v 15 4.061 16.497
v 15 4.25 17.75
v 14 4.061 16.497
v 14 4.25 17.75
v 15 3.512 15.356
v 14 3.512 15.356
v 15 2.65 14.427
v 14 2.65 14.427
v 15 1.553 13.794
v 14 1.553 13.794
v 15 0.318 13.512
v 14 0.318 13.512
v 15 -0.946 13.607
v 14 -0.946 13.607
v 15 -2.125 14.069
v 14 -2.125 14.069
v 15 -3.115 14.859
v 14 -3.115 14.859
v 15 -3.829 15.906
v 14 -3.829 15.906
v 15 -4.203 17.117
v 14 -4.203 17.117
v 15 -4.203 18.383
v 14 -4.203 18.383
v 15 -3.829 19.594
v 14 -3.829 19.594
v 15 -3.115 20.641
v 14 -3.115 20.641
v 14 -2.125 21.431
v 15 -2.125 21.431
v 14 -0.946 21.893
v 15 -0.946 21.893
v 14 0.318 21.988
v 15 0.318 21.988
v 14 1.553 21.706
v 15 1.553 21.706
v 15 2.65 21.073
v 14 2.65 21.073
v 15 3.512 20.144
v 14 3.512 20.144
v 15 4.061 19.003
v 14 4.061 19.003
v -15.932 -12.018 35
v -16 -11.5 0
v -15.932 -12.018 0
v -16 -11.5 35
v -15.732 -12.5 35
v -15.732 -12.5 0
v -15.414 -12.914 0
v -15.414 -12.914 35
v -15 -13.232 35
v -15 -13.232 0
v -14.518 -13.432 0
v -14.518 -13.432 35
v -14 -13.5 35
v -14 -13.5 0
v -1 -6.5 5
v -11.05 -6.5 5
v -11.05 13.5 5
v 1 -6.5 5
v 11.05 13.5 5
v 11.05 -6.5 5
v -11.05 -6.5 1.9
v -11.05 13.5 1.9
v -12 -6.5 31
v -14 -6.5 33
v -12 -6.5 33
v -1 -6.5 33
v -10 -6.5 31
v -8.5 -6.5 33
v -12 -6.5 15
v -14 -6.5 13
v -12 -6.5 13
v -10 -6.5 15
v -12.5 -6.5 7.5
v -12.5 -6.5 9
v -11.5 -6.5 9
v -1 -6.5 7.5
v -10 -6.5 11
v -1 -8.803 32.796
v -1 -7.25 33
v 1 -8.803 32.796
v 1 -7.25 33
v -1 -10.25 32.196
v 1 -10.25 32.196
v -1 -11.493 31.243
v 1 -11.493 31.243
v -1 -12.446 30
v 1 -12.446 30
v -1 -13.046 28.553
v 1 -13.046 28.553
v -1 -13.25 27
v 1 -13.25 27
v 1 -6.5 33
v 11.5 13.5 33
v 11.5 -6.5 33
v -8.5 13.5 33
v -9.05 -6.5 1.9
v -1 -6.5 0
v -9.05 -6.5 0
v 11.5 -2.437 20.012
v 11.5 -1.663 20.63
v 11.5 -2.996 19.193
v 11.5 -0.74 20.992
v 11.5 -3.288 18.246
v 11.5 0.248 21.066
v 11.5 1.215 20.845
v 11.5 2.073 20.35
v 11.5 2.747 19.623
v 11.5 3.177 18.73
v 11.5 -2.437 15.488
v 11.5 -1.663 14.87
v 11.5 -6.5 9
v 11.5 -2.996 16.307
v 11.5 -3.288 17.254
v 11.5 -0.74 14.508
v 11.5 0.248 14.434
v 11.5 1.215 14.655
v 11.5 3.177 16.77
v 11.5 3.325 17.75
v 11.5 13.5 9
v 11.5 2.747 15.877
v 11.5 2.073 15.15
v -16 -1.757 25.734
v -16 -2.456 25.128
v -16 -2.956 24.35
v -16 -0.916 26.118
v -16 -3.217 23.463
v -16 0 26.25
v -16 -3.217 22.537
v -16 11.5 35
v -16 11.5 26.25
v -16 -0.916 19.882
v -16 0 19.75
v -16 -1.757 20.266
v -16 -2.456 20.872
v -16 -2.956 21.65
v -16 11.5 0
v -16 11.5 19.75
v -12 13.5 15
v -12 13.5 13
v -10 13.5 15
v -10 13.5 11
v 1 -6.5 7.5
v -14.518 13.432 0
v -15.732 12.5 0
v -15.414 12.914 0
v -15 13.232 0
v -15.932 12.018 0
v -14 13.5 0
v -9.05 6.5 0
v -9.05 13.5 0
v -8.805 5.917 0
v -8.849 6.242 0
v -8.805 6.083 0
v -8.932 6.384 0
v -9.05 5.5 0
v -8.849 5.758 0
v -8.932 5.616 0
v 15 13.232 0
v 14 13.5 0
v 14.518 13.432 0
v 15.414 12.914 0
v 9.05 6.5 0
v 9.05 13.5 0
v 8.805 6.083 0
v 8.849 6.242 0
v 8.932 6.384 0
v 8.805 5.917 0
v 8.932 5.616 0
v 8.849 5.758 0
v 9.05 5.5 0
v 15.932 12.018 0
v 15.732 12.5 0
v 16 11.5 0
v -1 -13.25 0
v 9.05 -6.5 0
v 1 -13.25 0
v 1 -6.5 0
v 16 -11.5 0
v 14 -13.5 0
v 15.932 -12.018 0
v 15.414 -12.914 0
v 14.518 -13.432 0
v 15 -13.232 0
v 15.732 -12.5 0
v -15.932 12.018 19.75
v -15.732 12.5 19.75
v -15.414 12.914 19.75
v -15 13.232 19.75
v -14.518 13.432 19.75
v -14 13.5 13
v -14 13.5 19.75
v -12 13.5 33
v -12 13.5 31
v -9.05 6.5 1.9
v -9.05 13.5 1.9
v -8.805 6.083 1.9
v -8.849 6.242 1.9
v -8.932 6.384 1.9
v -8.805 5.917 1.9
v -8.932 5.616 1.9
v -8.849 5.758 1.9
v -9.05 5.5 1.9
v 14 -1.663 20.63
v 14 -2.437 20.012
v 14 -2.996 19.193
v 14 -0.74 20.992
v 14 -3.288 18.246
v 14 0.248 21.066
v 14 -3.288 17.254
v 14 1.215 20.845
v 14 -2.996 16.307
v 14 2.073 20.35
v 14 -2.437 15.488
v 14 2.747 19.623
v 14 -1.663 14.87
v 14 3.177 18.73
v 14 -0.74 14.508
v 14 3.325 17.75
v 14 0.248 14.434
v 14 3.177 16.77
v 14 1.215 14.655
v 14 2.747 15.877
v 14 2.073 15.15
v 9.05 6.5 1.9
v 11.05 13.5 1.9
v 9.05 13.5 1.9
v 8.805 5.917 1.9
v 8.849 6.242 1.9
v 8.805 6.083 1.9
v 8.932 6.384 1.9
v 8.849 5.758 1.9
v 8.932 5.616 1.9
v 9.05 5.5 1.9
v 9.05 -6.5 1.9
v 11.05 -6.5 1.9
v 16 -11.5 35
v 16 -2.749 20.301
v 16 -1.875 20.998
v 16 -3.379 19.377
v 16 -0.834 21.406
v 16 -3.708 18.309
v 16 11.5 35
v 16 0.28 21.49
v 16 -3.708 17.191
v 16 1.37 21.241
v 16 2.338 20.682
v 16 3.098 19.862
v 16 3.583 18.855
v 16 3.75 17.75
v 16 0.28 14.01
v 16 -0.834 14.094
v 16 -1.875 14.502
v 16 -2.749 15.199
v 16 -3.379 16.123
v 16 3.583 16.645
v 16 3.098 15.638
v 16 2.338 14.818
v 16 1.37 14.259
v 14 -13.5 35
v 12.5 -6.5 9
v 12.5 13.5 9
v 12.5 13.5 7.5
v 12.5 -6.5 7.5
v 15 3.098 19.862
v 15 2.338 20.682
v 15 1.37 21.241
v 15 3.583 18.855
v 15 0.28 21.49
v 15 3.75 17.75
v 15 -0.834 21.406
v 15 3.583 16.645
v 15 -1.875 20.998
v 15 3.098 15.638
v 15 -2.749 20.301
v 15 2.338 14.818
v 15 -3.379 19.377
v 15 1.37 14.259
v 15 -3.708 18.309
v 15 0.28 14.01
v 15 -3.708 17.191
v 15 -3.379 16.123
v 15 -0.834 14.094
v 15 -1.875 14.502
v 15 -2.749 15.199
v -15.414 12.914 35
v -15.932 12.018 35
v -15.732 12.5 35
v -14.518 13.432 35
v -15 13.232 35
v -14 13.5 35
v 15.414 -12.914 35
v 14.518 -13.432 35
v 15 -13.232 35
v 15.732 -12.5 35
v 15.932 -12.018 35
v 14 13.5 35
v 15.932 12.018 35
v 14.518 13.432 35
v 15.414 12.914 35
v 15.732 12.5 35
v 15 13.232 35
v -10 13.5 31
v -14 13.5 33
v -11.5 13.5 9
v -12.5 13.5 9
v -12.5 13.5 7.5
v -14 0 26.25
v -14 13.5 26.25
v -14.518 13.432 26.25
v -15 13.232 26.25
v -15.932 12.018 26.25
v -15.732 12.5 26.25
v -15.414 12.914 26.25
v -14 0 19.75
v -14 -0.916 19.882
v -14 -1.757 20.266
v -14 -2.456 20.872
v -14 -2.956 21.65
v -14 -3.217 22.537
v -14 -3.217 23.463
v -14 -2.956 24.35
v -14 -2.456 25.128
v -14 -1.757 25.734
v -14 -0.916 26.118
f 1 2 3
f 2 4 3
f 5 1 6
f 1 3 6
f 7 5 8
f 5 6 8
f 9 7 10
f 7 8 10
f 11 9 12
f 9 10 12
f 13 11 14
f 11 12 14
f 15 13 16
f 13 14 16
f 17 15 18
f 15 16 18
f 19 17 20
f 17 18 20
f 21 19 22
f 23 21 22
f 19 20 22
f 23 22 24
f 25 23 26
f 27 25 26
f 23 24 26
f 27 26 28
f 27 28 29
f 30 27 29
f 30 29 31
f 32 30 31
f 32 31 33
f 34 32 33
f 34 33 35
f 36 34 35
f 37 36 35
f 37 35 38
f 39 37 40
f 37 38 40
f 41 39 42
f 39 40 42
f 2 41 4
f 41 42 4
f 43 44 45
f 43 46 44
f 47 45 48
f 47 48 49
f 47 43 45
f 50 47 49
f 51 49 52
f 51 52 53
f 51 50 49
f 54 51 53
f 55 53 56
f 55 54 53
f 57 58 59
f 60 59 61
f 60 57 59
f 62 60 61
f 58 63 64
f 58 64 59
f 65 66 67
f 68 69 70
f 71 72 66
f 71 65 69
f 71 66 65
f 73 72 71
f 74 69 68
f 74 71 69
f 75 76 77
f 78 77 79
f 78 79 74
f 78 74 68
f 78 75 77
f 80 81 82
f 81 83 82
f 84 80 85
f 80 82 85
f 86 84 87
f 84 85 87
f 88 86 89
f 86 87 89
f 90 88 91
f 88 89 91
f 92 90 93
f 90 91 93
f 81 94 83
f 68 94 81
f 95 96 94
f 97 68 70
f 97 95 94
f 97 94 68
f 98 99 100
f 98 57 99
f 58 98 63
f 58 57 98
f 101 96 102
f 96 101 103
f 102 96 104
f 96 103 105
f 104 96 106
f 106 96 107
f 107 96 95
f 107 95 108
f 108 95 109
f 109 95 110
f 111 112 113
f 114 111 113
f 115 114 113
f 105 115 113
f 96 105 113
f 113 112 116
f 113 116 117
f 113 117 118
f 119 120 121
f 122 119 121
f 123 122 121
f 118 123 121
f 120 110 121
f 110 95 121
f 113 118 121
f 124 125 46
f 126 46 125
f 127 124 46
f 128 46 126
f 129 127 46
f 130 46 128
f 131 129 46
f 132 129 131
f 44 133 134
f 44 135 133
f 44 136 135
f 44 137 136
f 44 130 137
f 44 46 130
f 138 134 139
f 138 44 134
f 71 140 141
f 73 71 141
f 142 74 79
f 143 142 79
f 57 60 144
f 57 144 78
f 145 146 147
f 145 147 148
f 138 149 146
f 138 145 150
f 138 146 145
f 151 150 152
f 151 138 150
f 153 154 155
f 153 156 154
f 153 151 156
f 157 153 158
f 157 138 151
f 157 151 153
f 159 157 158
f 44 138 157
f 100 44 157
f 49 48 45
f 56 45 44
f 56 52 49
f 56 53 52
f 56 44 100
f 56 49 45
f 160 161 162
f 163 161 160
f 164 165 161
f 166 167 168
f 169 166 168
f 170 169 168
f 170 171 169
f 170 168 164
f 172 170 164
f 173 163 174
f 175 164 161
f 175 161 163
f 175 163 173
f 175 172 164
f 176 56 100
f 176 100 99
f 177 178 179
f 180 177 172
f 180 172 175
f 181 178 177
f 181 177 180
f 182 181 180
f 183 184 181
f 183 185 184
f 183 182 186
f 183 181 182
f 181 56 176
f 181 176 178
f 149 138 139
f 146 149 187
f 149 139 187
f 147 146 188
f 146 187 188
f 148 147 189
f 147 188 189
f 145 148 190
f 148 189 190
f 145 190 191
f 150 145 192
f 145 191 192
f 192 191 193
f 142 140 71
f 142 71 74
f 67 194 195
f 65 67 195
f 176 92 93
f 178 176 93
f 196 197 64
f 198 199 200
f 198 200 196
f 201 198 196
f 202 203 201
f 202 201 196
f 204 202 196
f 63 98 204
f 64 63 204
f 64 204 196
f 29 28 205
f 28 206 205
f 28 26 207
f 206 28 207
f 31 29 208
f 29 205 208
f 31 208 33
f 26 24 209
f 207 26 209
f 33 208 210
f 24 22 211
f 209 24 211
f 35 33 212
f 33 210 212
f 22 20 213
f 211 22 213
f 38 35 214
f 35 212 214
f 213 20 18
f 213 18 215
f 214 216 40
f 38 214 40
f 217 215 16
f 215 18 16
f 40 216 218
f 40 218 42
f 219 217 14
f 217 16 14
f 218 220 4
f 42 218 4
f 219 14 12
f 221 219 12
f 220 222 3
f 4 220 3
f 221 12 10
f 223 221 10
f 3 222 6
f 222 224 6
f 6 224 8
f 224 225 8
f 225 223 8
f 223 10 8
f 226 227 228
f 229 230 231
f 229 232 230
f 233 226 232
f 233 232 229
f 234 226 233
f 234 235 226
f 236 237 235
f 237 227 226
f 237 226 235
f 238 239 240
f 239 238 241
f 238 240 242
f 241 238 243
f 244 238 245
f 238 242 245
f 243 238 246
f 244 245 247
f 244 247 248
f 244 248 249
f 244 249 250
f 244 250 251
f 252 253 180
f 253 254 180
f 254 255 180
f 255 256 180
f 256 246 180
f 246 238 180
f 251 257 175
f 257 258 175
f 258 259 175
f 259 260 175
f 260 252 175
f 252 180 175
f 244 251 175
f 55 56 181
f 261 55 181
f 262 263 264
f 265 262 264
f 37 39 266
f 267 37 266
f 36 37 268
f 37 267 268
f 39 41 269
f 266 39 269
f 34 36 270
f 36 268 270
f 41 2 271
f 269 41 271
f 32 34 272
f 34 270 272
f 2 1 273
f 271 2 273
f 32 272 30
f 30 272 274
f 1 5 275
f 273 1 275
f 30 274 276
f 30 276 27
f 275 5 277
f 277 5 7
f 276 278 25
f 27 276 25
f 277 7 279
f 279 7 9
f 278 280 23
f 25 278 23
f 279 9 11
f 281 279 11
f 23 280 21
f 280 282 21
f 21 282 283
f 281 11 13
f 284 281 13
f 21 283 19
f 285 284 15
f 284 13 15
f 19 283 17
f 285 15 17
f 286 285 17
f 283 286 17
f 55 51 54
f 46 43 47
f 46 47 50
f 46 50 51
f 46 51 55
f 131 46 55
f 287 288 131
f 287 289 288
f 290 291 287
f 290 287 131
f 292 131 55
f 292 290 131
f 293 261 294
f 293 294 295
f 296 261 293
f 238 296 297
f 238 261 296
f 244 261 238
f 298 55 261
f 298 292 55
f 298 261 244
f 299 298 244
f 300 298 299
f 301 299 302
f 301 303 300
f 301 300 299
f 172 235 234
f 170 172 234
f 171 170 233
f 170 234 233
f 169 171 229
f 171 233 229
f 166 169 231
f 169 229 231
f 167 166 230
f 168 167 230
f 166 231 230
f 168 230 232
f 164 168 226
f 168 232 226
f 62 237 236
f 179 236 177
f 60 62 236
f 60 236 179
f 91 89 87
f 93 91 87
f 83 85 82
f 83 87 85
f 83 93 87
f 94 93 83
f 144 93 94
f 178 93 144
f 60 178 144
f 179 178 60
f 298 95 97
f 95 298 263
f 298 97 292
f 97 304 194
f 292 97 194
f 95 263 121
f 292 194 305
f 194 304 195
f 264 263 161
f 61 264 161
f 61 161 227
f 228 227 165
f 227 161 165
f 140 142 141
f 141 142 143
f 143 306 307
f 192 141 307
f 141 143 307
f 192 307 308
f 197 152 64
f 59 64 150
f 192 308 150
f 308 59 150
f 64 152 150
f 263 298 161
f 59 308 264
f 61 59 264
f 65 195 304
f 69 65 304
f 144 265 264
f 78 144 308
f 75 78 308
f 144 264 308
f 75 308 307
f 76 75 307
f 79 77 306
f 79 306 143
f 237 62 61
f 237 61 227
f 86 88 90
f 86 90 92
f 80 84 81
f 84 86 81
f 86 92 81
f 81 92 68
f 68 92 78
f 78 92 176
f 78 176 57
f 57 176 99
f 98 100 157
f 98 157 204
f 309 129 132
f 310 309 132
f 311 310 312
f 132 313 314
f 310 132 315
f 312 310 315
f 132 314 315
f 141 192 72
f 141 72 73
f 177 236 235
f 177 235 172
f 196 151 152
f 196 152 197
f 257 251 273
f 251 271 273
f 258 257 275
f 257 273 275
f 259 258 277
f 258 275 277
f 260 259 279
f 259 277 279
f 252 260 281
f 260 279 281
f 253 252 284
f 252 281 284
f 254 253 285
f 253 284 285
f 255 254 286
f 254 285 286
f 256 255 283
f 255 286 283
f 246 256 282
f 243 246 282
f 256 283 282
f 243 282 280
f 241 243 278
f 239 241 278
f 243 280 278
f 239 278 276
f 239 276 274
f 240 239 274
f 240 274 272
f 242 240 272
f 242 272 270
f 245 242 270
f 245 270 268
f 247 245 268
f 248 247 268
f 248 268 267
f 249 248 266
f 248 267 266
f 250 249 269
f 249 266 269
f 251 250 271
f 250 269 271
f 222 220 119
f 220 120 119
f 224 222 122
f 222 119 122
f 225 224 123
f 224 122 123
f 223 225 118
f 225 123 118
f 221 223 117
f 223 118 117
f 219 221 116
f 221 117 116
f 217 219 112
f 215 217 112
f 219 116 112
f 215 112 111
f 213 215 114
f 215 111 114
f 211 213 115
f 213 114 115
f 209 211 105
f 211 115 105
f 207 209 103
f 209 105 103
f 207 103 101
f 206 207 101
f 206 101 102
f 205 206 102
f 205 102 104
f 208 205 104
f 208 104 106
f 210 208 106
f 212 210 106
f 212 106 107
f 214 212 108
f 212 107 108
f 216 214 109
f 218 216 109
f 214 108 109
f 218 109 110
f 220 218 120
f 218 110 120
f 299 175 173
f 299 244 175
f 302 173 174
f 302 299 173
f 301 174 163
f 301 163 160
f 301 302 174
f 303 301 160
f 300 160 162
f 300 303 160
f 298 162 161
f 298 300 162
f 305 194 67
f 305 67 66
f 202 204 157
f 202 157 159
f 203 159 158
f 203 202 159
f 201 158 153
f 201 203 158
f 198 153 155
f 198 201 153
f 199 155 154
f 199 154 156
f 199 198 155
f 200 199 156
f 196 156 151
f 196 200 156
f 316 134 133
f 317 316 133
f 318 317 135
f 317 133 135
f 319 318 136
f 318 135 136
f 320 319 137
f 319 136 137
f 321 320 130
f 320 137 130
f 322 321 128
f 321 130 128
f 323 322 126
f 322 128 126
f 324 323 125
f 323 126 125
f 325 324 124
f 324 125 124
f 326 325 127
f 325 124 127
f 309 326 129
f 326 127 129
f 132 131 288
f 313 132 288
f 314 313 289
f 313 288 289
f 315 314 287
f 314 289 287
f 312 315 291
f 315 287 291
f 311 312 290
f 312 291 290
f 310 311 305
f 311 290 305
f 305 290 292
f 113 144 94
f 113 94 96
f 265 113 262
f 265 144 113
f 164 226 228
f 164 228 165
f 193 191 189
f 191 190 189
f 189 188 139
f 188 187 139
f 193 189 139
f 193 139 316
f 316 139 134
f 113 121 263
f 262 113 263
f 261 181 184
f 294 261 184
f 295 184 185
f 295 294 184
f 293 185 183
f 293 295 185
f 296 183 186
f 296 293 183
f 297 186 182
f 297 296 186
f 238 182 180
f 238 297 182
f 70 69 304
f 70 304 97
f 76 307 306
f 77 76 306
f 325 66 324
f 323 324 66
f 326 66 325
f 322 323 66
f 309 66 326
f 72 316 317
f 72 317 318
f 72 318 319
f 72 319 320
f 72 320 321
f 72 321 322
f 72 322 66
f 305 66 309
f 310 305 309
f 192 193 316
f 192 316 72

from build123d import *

# Parameters (mm, degrees)
SKETCH1_W               = 32
SKETCH1_H               = 27
BOSS_EXTRUDE1_DEPTH     = 35
FILLET1_R               = 2
CUT_EXTRUDE1_DEPTH      = 1
CUT_EXTRUDE1_DEPTH_BACK = 28
BOSS_EXTRUDE2_DEPTH     = 7
BOSS_EXTRUDE3_DEPTH     = 1.9
SKETCH5_W               = 2
SKETCH5_H               = 7
CUT_EXTRUDE2_DEPTH      = 33
CUT_EXTRUDE3_DEPTH      = 20
SKETCH7_W               = 2
SKETCH7_H               = 33
BOSS_EXTRUDE4_DEPTH     = 0.25
FILLET2_R               = 6
CUT_EXTRUDE5_DEPTH      = 4.5
SKETCH14_W              = 2.5
SKETCH14_H              = 20
CUT_EXTRUDE6_DEPTH      = 20
SKETCH16_W              = 2
SKETCH16_H              = 4
SKETCH16_H_2            = 2
BOSS_EXTRUDE5_DEPTH     = 20
BOSS_EXTRUDE6_DEPTH     = 20


with BuildPart() as part:
    # Sketch1 → Boss-Extrude1 (new body)
    with BuildSketch(Plane.XY):
        Rectangle(SKETCH1_W, SKETCH1_H)
    extrude(amount=BOSS_EXTRUDE1_DEPTH)

    # Fillet1
    fillet1_edges = [part.edges().sort_by_distance(p)[0] for p in [
        (16, -13.5, 17.5),
        (-16, -13.5, 17.5),
        (-16, 13.5, 17.5),
        (16, 13.5, 17.5),
    ]]
    fillet(fillet1_edges, radius=FILLET1_R)

    # Sketch2 → Cut-Extrude1 (cut, two sides)
    with BuildSketch(Plane.XZ.offset(13.5)) as cut_extrude1_sk:
        Polygon((-9.05, 0), (-9.05, 1.9), (-11.05, 1.9), (-11.05, 5), (11.05, 5), (11.05, 1.9), (9.05, 1.9), (9.05, 0), align=None)
    extrude(amount=CUT_EXTRUDE1_DEPTH, mode=Mode.SUBTRACT)
    extrude(cut_extrude1_sk.sketch, amount=-CUT_EXTRUDE1_DEPTH_BACK, mode=Mode.SUBTRACT)

    # Sketch3 → Boss-Extrude2 (add)
    with BuildSketch(Plane.XZ.offset(13.5)):
        Polygon((-9.05, 0), (-9.05, 1.9), (-11.05, 1.9), (-11.05, 5), (11.05, 5), (11.05, 1.9), (9.05, 1.9), (9.05, 0), align=None)
    extrude(amount=-BOSS_EXTRUDE2_DEPTH)

    # Sketch4 → Boss-Extrude3 (add)
    with BuildSketch(Plane(origin=(0, 0, 1.9), x_dir=(-1, 0, 0), z_dir=(0, 0, -1))):
        with BuildLine():
            Line((-9.05, 6.5), (-9.05, 5.5))
            ThreePointArc((-9.05, 5.5), (-8.8, 6), (-9.05, 6.5))
        make_face()
    boss_extrude3 = extrude(amount=BOSS_EXTRUDE3_DEPTH)

    # Mirror1: Boss-Extrude3 across plane
    add(boss_extrude3.mirror(Plane(origin=(0, 0, 0), x_dir=(0, 0, 1), z_dir=(1, 0, 0))))

    # Sketch5 → Cut-Extrude2 (cut)
    with BuildSketch(Plane(origin=(0, 0, 0), x_dir=(-1, 0, 0), z_dir=(0, 0, -1))):
        with Locations((0, -10)):
            Rectangle(SKETCH5_W, SKETCH5_H)
    extrude(amount=-CUT_EXTRUDE2_DEPTH, mode=Mode.SUBTRACT)

    # Sketch6 → Cut-Extrude3 (cut)
    with BuildSketch(Plane(origin=(0, 13.5, 0), x_dir=(1, 0, 0), z_dir=(0, 1, 0))):
        Polygon((-12.5, -7.5), (-12.5, -9), (-11.5, -9), (-11.5, -33), (11.5, -33), (11.5, -9), (12.5, -9), (12.5, -7.5), align=None)
    extrude(amount=-CUT_EXTRUDE3_DEPTH, mode=Mode.SUBTRACT)

    # Sketch7 → Boss-Extrude4 (add)
    with BuildSketch(Plane.XZ.offset(13.5)):
        with Locations((0, 16.5)):
            Rectangle(SKETCH7_W, SKETCH7_H)
    extrude(amount=-BOSS_EXTRUDE4_DEPTH)

    # Fillet2
    fillet2_edges = [part.edges().sort_by_distance(p)[0] for p in [
        (0, -13.25, 33),
    ]]
    fillet(fillet2_edges, radius=FILLET2_R)

    # Sketch9 → Cut-Revolve1 (revolve, cut)
    with BuildSketch(Plane(origin=(0, 0, 17.75), x_dir=(-1, 0, 0), z_dir=(0, 0, -1))):
        Polygon((-15, 4.25), (-14, 4.25), (-14, 3.325), (-11.5, 3.325), (-11.5, 0), (-16, 0), (-16, 3.75), (-15, 3.75), align=None)
    revolve(axis=Axis((16, 0, 17.75), (-1, 0, 0)), mode=Mode.SUBTRACT)

    # Sketch11 → Cut-Extrude5 (cut)
    with BuildSketch(Plane(origin=(-16, 0, 44), x_dir=(0, 0, -1), z_dir=(1, 0, 0))):
        with BuildLine():
            Line((24.25, 23), (24.25, 0))
            ThreePointArc((24.25, 0), (21, -3.25), (17.75, 0))
            Line((17.75, 0), (17.75, 23))
            ThreePointArc((17.75, 23), (21, 26.25), (24.25, 23))
        make_face()
    extrude(amount=CUT_EXTRUDE5_DEPTH, mode=Mode.SUBTRACT)

    # Sketch14 → Cut-Extrude6 (cut)
    with BuildSketch(Plane(origin=(0, 13.5, 0), x_dir=(1, 0, 0), z_dir=(0, 1, 0))):
        with Locations((-12.75, -23)):
            Rectangle(SKETCH14_W, SKETCH14_H)
    extrude(amount=-CUT_EXTRUDE6_DEPTH, mode=Mode.SUBTRACT)

    # Sketch16 → Boss-Extrude5 (add)
    with BuildSketch(Plane(origin=(0, 13.5, 0), x_dir=(1, 0, 0), z_dir=(0, 1, 0))):
        with Locations((-11, -13)):
            Rectangle(SKETCH16_W, SKETCH16_H)
        with Locations((-11, -32)):
            Rectangle(SKETCH16_W, SKETCH16_H_2)
    extrude(amount=-BOSS_EXTRUDE5_DEPTH)

    # Sketch20 → Boss-Extrude6 (add)
    with BuildSketch(Plane(origin=(0, 13.5, 0), x_dir=(1, 0, 0), z_dir=(0, 1, 0))):
        Polygon((-11.5, -9), (-10, -11), (-11.5, -11), align=None)
        Polygon((-10, -31), (-8.5, -33), (-10, -33), align=None)
    extrude(amount=-BOSS_EXTRUDE6_DEPTH)


solid = part.part
